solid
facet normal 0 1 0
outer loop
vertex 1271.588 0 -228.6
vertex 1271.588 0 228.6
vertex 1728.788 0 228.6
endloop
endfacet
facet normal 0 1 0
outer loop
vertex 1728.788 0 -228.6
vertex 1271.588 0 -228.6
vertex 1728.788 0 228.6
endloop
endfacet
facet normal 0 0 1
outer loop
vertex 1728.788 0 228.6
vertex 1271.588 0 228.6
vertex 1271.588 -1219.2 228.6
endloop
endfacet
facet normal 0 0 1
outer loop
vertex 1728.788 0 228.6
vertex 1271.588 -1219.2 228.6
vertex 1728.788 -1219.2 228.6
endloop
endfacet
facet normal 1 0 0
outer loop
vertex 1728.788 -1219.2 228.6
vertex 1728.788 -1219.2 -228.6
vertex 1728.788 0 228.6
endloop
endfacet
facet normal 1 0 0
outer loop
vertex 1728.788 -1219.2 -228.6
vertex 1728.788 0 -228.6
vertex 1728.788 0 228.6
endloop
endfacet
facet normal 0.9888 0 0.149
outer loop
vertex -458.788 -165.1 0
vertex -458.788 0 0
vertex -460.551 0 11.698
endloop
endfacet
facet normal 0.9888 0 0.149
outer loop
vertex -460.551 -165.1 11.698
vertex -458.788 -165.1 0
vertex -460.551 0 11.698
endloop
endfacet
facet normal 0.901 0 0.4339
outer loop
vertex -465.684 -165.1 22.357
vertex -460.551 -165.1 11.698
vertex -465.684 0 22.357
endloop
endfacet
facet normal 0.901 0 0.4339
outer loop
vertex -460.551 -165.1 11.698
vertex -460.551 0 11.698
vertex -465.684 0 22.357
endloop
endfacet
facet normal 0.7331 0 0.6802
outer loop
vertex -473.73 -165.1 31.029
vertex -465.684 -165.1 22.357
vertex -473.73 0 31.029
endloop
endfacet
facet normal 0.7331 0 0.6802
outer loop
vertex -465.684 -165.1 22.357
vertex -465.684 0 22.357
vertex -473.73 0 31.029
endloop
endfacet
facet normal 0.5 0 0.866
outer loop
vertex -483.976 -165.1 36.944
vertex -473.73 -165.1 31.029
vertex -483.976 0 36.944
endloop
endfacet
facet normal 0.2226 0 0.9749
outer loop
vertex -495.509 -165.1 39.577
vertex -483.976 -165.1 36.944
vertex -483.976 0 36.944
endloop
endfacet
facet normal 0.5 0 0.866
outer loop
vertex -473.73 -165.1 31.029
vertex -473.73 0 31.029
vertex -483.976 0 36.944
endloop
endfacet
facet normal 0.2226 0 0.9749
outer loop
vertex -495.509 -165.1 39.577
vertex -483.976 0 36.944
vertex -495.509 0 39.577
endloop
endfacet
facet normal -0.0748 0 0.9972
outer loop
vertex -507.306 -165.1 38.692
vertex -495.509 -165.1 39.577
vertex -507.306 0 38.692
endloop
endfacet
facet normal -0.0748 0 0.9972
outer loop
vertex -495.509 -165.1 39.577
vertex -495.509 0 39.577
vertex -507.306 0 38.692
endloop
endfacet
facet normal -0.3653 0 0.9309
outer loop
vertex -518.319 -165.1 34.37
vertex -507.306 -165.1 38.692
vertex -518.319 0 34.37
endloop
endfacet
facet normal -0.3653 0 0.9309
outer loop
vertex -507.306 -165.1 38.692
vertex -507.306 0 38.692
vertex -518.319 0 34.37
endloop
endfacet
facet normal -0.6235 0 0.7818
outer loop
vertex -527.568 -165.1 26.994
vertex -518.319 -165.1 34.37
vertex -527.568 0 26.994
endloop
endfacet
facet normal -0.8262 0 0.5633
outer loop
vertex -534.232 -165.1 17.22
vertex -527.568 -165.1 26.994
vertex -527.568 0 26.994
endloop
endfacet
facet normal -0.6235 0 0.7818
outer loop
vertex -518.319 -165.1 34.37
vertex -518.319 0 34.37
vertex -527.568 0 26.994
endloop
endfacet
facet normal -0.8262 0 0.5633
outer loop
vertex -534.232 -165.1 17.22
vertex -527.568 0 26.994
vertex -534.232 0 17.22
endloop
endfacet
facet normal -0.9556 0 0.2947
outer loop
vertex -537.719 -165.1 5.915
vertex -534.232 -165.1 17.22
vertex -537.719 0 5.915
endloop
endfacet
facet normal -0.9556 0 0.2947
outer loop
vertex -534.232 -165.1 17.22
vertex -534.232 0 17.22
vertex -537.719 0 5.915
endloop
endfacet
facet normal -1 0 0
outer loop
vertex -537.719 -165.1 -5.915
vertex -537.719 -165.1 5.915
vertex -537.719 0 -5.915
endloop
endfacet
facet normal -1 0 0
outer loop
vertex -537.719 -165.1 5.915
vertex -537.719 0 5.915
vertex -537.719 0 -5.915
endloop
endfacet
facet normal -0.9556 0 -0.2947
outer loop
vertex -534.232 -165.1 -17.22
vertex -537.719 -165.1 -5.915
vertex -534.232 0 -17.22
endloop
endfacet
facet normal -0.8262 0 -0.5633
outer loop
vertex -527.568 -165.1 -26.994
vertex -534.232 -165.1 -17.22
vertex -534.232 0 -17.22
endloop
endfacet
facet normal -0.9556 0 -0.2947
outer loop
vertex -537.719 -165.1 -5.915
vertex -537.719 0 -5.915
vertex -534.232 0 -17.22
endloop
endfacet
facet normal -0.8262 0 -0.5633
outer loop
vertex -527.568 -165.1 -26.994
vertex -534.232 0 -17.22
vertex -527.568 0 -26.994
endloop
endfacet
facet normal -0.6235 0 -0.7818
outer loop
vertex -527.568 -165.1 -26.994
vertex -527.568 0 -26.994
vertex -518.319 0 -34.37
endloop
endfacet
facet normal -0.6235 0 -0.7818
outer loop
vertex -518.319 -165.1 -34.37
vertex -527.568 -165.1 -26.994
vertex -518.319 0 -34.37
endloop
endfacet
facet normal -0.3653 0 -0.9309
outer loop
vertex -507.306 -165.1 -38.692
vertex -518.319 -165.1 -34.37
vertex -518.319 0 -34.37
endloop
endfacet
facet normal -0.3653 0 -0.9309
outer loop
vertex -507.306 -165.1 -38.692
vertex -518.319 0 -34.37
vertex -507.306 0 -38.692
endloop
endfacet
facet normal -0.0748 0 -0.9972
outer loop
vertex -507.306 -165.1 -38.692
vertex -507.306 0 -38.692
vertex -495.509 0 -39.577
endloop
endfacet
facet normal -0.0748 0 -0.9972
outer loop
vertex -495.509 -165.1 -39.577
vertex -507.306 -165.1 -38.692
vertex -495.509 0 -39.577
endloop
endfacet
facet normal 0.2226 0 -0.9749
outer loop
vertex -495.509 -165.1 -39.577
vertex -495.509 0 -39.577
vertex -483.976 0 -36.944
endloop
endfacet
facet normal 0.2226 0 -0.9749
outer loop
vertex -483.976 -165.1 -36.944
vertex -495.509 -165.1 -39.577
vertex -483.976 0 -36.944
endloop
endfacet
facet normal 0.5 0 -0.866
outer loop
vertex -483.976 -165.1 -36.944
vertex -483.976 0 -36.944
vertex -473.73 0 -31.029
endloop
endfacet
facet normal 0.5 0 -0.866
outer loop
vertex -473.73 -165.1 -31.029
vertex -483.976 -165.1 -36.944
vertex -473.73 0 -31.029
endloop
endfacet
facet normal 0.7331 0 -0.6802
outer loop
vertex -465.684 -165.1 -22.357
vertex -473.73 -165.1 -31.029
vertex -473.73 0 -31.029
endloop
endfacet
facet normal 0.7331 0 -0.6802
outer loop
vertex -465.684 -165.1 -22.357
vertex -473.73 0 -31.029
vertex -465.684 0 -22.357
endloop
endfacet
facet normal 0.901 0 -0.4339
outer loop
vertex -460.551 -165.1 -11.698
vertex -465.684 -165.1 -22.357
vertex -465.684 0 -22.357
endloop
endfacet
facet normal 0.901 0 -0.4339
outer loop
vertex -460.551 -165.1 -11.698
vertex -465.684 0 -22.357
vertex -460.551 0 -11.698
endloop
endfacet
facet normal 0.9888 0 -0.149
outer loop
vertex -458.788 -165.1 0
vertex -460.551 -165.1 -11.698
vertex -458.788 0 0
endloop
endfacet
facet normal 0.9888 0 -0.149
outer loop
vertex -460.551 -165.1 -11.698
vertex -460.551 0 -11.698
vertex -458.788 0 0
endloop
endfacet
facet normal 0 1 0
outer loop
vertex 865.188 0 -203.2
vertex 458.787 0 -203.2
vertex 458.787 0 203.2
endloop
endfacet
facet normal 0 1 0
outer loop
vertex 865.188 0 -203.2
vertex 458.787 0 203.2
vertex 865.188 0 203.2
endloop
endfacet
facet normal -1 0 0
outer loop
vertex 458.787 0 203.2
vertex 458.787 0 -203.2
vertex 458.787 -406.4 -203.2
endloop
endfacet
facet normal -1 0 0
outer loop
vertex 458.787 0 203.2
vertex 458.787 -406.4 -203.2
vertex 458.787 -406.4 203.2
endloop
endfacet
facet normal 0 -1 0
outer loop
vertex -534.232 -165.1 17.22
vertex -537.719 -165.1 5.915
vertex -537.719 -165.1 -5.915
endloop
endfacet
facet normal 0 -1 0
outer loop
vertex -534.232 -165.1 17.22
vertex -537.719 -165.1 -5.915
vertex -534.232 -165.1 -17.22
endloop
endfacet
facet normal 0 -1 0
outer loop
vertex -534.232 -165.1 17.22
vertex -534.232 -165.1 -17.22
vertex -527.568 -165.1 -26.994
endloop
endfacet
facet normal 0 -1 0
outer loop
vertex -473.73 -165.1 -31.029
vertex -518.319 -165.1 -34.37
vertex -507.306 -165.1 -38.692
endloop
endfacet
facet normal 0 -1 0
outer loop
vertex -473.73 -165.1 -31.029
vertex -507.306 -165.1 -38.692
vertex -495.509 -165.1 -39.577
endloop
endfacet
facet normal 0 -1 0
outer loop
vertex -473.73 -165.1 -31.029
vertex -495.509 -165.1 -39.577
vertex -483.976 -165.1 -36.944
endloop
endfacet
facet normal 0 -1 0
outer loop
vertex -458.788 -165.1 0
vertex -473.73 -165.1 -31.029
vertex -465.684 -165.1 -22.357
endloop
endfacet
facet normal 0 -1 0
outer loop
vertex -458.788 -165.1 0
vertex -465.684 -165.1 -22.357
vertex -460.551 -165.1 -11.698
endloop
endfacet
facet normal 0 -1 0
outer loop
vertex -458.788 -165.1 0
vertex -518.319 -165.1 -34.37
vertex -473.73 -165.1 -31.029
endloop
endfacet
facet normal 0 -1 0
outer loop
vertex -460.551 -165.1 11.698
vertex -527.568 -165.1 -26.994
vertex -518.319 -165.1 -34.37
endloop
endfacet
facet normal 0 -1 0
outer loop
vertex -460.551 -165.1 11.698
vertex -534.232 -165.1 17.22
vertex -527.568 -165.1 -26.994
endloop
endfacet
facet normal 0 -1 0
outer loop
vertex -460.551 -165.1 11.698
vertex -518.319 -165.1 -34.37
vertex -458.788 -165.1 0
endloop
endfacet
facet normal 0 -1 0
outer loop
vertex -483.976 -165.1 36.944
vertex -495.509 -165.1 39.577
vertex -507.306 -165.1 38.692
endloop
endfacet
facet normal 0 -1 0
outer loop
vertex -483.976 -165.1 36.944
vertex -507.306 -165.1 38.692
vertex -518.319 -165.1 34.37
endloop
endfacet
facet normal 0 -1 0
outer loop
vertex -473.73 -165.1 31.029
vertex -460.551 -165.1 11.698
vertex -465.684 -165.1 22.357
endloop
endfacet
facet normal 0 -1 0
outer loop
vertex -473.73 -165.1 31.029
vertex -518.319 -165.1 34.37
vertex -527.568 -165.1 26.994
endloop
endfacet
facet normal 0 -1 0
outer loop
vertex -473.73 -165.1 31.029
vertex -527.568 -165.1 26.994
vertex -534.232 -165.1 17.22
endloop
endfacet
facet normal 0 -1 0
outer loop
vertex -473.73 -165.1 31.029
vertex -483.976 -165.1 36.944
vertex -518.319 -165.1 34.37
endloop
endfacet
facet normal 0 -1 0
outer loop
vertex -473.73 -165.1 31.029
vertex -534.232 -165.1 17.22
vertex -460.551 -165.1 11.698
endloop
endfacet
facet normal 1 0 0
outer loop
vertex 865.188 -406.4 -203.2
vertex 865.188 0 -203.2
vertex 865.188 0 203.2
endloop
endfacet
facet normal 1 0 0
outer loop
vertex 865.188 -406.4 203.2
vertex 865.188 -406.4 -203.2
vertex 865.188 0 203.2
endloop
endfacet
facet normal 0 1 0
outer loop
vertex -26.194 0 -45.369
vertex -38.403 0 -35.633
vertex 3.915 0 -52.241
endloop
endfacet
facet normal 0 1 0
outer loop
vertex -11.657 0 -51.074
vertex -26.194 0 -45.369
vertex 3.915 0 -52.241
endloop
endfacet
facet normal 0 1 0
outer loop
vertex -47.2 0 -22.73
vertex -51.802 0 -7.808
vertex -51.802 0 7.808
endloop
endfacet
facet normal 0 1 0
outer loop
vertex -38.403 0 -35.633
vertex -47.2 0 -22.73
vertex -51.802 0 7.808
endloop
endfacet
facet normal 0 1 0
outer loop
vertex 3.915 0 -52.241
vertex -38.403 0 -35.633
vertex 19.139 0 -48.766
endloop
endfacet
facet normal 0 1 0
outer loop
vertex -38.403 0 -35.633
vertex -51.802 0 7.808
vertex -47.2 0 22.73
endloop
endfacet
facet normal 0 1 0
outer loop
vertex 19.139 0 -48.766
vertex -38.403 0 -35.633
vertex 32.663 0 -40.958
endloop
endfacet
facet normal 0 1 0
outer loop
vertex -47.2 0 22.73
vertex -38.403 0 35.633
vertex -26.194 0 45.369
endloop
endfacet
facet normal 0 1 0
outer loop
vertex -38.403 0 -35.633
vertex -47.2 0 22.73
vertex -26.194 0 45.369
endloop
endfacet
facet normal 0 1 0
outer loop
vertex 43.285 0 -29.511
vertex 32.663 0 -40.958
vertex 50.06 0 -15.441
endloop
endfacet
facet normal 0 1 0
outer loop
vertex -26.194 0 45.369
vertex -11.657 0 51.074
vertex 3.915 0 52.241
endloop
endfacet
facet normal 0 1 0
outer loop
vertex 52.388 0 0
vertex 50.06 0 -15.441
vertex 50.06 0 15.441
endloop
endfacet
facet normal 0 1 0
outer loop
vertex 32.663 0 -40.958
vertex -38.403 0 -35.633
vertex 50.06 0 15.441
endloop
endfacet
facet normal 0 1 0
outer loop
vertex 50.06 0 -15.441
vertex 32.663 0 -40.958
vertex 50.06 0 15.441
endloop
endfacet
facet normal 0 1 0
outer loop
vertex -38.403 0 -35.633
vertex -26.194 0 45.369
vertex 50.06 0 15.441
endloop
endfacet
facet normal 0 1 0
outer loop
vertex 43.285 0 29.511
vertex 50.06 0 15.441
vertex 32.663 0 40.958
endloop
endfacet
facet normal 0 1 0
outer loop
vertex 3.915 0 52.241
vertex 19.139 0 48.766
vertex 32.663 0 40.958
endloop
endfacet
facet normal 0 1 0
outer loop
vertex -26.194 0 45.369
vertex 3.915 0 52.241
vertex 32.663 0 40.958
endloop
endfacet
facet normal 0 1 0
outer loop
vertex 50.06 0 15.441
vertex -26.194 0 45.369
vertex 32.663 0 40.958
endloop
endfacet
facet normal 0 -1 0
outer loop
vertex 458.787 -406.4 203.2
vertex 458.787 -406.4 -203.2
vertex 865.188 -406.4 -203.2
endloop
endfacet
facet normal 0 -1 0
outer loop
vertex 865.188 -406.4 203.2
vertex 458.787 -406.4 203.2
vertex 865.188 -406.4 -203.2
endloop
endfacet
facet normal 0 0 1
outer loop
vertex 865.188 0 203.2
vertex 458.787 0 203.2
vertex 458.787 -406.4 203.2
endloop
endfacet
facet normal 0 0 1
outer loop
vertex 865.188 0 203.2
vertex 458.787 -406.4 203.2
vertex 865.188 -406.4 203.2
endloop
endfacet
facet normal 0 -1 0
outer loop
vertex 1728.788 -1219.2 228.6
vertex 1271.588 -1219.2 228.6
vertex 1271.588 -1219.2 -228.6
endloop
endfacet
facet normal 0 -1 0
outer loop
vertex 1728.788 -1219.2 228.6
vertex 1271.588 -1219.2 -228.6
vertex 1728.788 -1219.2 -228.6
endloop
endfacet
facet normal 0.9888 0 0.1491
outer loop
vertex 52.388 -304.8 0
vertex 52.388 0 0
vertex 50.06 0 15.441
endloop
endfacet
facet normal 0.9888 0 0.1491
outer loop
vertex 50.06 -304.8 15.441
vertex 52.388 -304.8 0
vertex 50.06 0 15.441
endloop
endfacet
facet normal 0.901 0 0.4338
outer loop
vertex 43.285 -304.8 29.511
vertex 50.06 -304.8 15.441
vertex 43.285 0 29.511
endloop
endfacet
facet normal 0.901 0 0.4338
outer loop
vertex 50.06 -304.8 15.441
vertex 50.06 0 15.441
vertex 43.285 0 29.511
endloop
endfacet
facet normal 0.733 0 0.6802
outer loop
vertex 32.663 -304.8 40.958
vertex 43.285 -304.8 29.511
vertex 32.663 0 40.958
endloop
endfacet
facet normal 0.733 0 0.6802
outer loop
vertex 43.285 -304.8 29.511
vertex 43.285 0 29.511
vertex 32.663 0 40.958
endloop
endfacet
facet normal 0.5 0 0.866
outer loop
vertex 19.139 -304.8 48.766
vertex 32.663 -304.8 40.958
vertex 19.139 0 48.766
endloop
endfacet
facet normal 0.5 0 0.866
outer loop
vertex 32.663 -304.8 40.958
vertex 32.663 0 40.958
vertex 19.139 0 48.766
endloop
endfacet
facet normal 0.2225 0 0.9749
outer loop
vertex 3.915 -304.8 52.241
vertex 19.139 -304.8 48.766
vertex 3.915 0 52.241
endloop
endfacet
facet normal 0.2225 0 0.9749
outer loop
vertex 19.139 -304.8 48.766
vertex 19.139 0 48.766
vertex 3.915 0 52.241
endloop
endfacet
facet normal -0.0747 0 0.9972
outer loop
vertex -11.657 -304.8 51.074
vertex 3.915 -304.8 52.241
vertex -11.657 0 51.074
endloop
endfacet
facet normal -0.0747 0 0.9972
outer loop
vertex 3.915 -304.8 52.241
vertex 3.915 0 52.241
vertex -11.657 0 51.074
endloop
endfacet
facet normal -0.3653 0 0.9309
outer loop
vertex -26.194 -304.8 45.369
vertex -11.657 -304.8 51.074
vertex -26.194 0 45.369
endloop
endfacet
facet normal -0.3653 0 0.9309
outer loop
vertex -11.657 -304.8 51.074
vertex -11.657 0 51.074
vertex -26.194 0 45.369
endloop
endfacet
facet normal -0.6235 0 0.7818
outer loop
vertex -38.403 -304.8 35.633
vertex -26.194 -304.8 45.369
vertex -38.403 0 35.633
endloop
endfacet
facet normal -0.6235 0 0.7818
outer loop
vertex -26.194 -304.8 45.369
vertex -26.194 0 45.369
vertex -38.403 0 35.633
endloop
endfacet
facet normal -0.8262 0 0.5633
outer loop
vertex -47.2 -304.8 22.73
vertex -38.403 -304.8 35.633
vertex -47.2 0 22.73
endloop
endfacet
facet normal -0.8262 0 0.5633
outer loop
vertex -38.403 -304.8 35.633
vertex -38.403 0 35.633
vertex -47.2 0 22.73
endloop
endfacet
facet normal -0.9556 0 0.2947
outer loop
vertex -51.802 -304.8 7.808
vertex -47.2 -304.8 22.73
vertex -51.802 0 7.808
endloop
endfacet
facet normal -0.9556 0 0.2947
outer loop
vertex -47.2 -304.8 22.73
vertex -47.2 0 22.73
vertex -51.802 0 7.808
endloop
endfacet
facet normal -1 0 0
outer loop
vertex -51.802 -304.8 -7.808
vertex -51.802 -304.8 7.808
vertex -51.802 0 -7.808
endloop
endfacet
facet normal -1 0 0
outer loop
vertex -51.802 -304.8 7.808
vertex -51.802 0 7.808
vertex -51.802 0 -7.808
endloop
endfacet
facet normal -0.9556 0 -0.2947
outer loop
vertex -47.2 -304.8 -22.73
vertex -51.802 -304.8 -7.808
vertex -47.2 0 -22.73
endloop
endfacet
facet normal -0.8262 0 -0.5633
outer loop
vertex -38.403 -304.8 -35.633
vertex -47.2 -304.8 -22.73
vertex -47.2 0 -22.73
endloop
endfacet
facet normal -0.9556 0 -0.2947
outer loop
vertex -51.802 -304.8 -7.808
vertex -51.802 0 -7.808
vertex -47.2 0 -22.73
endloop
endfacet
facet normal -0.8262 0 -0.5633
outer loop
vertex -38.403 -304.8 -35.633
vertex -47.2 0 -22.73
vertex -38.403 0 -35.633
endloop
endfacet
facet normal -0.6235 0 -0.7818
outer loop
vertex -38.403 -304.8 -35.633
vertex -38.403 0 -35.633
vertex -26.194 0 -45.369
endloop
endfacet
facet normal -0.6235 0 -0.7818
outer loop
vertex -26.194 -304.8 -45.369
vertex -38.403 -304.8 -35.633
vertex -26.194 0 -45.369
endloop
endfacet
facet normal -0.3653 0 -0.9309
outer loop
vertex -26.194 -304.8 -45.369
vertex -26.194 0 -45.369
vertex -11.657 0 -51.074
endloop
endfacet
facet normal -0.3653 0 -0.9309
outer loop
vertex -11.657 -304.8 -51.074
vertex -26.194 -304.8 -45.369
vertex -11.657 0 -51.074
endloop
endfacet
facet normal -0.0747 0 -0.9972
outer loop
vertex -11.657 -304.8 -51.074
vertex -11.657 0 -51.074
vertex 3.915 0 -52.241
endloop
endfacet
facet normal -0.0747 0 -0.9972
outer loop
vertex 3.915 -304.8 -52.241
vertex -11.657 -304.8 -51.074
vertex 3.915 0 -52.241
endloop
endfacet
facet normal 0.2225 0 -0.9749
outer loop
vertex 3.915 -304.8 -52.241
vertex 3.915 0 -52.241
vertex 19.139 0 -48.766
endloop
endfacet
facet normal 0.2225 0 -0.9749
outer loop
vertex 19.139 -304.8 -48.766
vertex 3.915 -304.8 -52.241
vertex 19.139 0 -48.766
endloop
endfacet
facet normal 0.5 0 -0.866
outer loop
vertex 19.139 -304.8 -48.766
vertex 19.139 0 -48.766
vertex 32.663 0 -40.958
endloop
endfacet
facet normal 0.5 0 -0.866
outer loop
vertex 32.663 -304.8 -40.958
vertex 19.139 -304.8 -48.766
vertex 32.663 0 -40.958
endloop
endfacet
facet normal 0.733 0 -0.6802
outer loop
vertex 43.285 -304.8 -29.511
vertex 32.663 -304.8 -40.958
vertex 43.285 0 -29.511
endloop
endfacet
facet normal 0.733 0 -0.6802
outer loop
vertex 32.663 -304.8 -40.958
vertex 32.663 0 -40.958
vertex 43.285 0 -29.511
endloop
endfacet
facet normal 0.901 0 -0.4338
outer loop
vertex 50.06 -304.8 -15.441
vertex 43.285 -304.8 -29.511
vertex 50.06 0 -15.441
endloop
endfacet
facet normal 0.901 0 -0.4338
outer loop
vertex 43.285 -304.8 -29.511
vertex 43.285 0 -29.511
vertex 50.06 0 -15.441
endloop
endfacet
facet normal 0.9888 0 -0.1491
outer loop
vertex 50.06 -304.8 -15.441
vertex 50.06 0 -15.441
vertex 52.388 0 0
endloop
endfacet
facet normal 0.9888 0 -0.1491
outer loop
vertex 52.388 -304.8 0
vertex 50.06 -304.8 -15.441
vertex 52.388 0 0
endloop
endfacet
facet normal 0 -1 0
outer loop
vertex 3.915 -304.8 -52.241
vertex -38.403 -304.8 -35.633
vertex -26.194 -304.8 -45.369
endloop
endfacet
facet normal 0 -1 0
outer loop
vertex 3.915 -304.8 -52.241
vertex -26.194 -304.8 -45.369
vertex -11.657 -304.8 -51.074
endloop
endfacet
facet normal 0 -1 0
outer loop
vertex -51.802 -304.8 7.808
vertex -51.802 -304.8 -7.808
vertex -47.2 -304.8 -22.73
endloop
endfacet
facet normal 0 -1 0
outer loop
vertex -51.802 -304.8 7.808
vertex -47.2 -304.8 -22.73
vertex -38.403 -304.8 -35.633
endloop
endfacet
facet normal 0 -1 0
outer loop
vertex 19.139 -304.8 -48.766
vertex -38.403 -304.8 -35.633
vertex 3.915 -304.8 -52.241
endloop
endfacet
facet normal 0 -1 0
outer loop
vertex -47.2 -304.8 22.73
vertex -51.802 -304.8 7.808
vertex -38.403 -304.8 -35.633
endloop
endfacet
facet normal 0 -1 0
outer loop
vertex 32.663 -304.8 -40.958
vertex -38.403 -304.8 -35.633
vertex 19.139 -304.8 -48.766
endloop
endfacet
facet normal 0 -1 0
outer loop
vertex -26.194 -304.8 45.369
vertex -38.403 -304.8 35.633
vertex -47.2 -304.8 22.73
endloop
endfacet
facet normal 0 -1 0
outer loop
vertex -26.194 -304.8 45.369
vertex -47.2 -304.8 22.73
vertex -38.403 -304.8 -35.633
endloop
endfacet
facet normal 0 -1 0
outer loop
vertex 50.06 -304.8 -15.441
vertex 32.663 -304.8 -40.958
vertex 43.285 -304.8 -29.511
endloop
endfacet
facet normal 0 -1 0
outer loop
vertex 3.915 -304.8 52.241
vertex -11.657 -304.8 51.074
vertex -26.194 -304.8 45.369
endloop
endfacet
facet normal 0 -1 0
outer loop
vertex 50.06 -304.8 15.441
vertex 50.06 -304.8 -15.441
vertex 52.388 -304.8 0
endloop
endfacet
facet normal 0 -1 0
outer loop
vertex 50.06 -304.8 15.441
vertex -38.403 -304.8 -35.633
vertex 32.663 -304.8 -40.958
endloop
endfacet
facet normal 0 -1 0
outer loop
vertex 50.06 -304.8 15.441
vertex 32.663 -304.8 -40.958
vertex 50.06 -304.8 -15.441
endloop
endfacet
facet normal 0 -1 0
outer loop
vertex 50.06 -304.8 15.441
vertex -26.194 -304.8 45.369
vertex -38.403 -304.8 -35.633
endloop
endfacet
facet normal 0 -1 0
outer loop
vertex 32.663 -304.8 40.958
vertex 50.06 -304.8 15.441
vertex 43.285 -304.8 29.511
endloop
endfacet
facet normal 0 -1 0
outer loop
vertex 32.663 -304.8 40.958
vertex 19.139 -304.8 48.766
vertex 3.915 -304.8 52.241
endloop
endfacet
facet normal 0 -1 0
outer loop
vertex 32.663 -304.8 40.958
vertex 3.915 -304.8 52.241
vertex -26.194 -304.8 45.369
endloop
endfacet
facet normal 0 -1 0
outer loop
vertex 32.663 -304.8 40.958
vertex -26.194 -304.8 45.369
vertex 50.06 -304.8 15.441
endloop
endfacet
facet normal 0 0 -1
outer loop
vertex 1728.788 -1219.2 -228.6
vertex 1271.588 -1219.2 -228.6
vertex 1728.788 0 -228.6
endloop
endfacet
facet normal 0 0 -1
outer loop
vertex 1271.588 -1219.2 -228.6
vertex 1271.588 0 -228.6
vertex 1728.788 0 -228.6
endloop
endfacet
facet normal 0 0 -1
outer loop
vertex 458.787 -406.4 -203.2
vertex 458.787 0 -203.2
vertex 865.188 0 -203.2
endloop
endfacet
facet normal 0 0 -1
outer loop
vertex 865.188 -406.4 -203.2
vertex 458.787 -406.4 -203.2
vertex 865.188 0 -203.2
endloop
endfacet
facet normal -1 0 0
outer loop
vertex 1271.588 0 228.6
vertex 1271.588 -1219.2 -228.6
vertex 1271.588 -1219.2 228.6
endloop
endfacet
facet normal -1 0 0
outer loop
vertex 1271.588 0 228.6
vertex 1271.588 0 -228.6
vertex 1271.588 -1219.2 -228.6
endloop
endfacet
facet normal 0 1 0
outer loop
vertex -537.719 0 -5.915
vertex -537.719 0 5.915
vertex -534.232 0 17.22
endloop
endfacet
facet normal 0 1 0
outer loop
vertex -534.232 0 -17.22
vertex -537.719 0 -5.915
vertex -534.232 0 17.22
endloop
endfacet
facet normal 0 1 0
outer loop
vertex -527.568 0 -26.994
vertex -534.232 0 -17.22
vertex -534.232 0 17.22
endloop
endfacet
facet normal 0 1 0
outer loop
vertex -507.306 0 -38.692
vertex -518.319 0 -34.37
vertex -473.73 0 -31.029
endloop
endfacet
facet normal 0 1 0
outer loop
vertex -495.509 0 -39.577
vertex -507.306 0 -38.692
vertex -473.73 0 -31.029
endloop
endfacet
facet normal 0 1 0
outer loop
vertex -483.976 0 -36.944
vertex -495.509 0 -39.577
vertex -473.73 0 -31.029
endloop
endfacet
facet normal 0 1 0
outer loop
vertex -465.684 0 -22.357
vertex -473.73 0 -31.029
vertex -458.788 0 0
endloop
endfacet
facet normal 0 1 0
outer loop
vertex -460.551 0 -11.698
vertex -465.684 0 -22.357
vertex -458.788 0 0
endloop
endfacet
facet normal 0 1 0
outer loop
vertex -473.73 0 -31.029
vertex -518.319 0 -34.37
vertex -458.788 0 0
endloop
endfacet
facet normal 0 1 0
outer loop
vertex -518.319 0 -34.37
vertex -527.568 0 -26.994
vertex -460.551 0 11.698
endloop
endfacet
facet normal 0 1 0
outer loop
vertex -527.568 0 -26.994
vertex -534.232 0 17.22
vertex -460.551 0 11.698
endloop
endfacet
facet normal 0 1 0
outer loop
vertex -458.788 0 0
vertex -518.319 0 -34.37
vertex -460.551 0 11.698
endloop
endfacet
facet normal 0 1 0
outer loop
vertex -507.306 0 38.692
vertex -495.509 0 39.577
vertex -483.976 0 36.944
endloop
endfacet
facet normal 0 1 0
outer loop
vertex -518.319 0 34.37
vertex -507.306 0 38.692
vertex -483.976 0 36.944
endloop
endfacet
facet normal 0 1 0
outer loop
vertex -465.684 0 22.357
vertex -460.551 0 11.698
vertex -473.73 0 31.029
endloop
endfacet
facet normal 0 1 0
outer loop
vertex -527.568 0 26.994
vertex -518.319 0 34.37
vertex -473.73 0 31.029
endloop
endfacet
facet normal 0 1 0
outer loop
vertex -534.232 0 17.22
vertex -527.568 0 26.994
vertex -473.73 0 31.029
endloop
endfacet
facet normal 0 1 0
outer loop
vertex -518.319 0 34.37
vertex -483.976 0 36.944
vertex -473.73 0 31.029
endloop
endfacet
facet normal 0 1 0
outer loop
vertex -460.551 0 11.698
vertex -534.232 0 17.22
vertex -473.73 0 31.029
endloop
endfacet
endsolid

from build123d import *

# Parameters (mm, degrees)
F0_R     = 52.3875
F1_DEPTH = 304.8
F2_R     = 39.6875
F3_DEPTH = 165.1
F4_W     = 406.4
F4_H     = 406.4
F4_W_2   = 457.2
F4_H_2   = 457.2
F5_DEPTH = 406.4
F6_W     = 457.2
F6_H     = 457.2
F7_DEPTH = 812.8


with BuildPart() as f1:
    # F0 (on Front) → F1 (new body)
    with BuildSketch(Plane.XZ):
        Circle(F0_R)
    extrude(amount=F1_DEPTH)


with BuildPart() as f3:
    # F2 (on Front) → F3 (new body)
    with BuildSketch(Plane.XZ):
        with Locations((-498.475, 0)):
            Circle(F2_R)
    extrude(amount=F3_DEPTH)


with BuildPart() as f5:
    # F4 (on Front) → F5 (new body)
    with BuildSketch(Plane.XZ):
        with Locations((661.9875, 0)):
            Rectangle(F4_W, F4_H)
        with Locations((1500.1875, 0)):
            Rectangle(F4_W_2, F4_H_2)
    extrude(amount=F5_DEPTH)

    # F6 (on face) → F7 (join)
    with BuildSketch(Plane.XZ.offset(406.4)):
        with Locations((1500.1875, 0)):
            Rectangle(F6_W, F6_H)
    extrude(amount=F7_DEPTH)


solid = Compound([f1.part, f3.part, f5.part])
